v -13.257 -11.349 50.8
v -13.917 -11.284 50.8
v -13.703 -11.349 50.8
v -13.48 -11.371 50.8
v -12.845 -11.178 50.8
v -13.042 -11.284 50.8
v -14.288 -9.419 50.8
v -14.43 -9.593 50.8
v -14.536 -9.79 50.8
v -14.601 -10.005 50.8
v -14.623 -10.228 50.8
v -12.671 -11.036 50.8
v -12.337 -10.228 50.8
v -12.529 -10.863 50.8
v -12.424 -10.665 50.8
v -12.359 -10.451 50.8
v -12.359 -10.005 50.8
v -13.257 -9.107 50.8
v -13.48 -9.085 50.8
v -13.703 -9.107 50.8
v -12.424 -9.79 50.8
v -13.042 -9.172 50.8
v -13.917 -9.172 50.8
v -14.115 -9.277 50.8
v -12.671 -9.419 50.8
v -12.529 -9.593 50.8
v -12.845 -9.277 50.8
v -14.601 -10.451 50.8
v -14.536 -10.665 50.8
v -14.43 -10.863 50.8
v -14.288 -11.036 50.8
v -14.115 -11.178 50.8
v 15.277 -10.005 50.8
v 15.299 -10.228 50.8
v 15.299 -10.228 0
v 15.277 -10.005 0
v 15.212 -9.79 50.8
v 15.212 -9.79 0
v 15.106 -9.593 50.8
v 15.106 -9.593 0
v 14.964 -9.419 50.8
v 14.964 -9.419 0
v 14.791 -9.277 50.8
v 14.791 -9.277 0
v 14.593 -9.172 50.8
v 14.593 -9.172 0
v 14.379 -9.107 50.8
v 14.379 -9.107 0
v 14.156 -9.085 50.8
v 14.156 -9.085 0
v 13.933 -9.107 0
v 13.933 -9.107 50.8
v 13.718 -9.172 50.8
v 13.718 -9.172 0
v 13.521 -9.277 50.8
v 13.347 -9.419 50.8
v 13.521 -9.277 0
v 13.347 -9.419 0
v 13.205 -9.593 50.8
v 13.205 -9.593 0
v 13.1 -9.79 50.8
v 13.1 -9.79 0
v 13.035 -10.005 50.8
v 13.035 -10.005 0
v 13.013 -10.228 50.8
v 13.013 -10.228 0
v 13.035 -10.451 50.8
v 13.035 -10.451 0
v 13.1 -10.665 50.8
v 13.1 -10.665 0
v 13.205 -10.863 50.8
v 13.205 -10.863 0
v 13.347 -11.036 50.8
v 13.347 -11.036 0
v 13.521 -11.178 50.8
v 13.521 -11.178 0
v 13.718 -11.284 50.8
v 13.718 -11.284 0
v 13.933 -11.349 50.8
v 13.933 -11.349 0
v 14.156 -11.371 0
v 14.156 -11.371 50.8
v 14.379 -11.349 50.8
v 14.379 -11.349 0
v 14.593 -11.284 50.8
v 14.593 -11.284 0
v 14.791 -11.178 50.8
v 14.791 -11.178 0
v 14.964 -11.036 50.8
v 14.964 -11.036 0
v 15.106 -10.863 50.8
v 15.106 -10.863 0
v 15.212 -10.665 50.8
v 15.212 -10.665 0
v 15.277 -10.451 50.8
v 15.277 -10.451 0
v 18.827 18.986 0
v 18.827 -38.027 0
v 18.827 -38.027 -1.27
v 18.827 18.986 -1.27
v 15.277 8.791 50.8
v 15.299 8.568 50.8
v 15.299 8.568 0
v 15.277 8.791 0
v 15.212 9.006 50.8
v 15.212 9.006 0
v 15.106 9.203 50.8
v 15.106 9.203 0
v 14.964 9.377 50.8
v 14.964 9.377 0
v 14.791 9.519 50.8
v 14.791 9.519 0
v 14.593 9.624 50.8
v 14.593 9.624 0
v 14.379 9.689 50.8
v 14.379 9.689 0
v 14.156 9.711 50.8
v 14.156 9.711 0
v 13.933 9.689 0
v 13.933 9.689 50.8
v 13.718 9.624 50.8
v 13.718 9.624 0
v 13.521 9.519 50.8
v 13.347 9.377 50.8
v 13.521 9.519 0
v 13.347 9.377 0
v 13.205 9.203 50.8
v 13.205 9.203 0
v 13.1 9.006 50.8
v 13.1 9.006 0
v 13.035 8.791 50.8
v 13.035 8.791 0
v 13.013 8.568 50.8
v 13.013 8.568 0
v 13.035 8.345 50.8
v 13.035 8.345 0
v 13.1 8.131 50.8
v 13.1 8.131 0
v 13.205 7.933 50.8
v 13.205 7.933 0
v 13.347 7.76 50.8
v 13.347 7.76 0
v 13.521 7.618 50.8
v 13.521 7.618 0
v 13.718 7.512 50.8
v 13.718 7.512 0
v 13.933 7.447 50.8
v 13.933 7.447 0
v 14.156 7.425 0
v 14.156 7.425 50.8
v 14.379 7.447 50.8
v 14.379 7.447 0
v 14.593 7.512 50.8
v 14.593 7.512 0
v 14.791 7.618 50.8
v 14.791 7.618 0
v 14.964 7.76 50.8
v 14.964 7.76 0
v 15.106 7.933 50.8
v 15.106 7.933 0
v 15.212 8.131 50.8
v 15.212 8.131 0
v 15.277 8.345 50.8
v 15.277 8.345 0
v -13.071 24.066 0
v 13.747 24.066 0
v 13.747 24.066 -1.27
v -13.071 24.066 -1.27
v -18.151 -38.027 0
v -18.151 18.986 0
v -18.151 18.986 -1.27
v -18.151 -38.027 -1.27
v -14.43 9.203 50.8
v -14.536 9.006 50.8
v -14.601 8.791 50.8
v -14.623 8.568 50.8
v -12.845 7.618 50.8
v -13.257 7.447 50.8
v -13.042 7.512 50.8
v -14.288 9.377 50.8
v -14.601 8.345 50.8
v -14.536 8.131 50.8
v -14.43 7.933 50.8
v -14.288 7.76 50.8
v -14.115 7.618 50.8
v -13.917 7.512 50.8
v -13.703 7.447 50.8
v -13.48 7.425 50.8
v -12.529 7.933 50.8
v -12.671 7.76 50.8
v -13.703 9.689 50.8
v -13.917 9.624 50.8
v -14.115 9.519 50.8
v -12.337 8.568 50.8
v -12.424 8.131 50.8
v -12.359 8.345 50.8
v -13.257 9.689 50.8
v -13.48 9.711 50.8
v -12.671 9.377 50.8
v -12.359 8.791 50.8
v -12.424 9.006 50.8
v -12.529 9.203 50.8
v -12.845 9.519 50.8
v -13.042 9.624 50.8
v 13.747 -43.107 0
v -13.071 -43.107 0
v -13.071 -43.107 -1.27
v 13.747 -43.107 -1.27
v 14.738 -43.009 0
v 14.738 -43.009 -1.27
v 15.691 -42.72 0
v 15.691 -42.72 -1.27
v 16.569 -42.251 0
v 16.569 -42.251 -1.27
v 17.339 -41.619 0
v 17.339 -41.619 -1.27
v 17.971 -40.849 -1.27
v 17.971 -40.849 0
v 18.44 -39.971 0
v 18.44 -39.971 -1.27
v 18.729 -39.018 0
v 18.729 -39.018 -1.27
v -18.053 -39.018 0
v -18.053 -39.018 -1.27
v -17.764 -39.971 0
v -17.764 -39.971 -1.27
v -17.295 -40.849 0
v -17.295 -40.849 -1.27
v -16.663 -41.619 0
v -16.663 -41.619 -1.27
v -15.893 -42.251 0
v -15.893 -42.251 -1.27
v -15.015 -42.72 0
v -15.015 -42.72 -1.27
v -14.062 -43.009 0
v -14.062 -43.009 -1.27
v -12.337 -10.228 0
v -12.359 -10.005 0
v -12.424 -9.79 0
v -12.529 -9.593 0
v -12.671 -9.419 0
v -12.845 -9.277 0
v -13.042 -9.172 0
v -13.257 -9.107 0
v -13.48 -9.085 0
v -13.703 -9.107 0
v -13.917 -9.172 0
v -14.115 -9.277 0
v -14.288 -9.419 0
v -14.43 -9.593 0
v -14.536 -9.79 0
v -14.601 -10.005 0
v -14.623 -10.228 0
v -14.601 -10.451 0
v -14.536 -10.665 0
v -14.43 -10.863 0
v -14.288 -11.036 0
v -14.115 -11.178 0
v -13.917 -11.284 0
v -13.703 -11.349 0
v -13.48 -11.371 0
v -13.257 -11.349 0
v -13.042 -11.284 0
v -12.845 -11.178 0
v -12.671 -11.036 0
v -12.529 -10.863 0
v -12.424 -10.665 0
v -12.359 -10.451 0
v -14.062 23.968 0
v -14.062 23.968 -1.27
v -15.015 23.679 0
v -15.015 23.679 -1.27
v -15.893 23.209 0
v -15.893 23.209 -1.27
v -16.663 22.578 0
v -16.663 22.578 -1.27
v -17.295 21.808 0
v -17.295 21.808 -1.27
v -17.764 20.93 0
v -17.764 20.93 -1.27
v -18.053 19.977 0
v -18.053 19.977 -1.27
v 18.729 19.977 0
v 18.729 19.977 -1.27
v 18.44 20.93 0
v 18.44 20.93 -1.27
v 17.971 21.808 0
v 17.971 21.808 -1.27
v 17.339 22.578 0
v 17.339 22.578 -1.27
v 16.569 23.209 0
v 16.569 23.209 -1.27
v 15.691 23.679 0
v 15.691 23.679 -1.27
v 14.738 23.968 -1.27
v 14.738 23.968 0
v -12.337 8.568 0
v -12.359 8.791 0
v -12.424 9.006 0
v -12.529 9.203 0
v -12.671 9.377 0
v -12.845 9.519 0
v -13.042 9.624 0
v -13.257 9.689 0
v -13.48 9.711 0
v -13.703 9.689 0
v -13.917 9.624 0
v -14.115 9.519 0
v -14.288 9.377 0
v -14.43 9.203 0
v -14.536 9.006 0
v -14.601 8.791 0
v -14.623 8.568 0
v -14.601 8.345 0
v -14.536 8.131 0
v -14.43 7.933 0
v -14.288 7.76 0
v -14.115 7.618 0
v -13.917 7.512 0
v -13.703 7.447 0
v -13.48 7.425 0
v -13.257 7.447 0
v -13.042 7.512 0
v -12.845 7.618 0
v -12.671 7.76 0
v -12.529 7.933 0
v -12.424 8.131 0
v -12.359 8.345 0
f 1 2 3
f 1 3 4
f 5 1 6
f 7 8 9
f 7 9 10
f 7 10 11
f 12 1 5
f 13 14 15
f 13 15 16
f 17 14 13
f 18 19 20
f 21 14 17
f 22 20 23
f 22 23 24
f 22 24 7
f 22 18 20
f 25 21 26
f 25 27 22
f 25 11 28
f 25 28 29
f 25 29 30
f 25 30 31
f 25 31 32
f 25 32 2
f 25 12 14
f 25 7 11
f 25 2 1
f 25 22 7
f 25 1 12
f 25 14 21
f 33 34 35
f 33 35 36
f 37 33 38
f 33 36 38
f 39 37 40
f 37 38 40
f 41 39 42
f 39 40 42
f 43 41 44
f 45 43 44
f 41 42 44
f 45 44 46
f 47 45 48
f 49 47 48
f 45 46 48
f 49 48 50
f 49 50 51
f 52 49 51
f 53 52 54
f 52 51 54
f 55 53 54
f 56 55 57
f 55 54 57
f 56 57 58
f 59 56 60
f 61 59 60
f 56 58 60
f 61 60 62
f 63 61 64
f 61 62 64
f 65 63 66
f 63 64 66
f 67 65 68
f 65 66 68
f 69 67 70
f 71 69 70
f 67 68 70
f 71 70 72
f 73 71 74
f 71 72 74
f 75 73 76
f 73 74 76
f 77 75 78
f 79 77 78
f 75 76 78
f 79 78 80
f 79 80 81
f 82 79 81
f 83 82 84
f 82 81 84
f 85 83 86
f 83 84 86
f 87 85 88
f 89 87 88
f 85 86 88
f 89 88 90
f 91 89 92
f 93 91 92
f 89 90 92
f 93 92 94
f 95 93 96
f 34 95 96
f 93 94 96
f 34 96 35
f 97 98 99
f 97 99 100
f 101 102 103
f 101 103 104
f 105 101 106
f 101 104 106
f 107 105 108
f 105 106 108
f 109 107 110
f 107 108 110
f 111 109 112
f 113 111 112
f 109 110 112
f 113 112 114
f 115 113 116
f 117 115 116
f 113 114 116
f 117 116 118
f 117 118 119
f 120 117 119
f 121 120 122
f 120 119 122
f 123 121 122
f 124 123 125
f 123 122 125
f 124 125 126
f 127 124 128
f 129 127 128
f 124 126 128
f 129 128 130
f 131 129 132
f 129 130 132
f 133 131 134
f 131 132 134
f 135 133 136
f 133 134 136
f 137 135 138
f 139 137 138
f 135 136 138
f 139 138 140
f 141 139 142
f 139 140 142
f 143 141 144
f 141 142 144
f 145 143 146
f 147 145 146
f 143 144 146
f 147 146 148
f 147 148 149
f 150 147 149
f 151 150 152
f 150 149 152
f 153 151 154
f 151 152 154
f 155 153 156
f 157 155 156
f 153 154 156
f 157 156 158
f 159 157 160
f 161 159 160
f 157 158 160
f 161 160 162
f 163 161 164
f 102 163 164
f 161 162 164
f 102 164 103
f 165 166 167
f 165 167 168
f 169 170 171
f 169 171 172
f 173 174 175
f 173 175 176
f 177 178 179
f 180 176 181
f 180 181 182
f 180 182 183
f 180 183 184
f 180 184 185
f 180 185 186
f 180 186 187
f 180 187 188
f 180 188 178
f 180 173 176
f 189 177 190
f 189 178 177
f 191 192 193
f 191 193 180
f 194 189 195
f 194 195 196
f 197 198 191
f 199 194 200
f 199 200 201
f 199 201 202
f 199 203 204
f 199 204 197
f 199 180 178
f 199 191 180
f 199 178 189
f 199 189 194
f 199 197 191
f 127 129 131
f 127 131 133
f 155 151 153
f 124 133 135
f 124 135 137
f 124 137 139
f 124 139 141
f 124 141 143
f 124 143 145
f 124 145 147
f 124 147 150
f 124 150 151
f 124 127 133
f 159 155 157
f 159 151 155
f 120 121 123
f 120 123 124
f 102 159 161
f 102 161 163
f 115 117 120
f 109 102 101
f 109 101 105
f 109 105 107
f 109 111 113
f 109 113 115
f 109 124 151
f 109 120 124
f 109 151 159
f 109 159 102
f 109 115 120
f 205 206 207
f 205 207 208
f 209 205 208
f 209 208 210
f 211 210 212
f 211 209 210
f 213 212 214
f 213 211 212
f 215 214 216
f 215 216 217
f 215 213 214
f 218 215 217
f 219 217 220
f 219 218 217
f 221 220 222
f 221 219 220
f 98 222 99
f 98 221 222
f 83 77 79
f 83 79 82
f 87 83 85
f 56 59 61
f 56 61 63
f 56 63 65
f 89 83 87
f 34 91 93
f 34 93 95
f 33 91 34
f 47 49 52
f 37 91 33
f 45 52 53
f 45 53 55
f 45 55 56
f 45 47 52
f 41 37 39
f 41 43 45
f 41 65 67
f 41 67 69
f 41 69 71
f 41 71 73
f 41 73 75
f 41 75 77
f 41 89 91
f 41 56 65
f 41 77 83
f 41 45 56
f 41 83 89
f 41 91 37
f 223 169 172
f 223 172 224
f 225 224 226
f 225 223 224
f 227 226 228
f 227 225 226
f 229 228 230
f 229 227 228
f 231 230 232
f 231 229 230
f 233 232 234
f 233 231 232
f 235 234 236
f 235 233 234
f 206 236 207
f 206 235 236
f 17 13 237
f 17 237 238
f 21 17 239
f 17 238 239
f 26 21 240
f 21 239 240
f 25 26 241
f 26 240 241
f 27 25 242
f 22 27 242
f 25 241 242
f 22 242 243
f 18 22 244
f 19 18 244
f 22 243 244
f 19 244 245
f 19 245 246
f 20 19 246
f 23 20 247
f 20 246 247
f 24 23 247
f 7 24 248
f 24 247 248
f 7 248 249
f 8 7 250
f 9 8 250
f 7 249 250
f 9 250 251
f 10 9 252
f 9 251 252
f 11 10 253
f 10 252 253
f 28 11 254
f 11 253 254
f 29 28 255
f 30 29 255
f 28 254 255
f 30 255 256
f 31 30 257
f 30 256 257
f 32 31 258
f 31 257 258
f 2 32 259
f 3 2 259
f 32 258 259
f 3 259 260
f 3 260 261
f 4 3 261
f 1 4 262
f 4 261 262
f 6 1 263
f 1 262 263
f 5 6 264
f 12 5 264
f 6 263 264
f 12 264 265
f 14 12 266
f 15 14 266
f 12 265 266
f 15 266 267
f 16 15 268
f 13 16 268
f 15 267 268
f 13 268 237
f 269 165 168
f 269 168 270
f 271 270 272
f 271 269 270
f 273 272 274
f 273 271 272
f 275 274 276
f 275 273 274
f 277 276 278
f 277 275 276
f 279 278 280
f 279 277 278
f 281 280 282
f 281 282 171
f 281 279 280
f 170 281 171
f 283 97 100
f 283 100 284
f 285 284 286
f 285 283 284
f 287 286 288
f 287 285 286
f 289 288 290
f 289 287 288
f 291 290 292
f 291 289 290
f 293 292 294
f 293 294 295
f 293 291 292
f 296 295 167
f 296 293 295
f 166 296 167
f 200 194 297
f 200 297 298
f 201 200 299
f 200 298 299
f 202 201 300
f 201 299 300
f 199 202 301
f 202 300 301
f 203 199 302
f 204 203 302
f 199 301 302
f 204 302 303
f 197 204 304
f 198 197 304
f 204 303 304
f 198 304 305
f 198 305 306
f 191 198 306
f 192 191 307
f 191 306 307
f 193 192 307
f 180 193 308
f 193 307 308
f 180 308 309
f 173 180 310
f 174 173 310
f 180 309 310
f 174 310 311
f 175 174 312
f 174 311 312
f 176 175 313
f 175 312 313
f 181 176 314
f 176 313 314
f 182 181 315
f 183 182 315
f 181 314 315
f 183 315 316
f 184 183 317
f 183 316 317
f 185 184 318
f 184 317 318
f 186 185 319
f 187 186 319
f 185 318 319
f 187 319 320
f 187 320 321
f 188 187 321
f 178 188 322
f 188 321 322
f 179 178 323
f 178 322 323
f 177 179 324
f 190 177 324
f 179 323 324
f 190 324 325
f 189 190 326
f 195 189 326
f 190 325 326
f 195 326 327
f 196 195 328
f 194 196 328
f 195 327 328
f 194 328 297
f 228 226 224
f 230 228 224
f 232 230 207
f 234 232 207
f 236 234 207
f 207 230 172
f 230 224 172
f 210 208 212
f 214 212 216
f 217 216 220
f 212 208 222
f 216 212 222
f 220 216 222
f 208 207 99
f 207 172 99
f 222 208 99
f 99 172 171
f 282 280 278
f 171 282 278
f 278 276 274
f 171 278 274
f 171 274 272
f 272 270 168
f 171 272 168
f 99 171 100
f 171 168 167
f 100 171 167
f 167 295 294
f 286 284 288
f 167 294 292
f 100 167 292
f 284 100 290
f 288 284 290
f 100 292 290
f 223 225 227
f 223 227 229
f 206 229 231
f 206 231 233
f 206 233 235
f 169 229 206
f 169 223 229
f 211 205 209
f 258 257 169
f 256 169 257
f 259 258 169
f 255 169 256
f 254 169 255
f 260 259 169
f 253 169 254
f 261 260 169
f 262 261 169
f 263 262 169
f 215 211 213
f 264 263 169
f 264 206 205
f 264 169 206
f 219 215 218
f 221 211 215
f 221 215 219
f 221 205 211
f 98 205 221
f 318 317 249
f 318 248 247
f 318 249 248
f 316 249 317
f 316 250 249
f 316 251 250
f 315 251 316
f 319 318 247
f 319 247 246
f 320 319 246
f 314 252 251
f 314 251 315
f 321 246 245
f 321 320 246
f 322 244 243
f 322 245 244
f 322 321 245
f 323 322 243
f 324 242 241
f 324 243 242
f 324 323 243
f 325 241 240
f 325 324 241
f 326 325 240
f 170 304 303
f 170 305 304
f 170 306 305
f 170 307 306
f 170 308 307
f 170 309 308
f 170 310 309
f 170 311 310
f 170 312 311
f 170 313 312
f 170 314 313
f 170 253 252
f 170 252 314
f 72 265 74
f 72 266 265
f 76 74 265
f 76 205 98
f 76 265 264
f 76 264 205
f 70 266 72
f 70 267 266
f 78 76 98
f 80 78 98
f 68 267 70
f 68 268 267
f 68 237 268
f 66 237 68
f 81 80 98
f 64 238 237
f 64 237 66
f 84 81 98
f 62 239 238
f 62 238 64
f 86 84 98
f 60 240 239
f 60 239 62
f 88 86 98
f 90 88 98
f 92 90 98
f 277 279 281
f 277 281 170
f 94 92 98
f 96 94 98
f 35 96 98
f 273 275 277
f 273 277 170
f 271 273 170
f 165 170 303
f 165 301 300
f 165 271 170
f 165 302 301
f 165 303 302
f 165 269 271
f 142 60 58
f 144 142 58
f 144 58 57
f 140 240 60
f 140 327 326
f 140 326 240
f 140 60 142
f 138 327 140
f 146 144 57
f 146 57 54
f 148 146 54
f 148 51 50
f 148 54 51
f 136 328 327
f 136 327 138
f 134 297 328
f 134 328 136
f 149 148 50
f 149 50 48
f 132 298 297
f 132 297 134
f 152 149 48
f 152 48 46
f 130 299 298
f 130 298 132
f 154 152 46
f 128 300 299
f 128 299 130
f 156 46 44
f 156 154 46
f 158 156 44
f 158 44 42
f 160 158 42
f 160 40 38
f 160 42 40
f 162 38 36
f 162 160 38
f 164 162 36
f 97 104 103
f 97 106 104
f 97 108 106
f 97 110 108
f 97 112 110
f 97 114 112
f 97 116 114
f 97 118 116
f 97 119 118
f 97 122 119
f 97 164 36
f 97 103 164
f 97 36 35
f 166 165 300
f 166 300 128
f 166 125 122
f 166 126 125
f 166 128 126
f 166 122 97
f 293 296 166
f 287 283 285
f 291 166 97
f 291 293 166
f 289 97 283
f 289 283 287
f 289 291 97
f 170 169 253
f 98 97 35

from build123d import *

# Parameters (mm, degrees)
F0_R     = 1.143
F1_DEPTH = 50.8
F2_DEPTH = 1.27


with BuildPart() as f1:
    # F0 (on Top) → F1 (new body)
    with BuildSketch(Plane.XY):
        with Locations((-13.479616519, -10.2275963136)):
            Circle(F0_R)
    extrude(amount=F1_DEPTH)



with BuildPart() as f1b:
    # F0 (on Top) → F1, piece 2 (new body)
    with BuildSketch(Plane.XY):
        with Locations((-13.479616519, 8.5684026553)):
            Circle(F0_R)
    extrude(amount=F1_DEPTH)


with BuildPart() as f1c:
    # F0 (on Top) → F1, piece 3 (new body)
    with BuildSketch(Plane.XY):
        with Locations((14.1555836841, 8.5684026553)):
            Circle(F0_R)
    extrude(amount=F1_DEPTH)


with BuildPart() as f1d:
    # F0 (on Top) → F1, piece 4 (new body)
    with BuildSketch(Plane.XY):
        with Locations((14.1555836841, -10.2275963136)):
            Circle(F0_R)
    extrude(amount=F1_DEPTH)


with BuildPart() as f1_1:
    add(f1.part)

    add(f1b.part)  # F2 merges F1b

    add(f1c.part)  # F2 merges F1c

    add(f1d.part)  # F2 merges F1d
    # F0 (on Top) → F2 (join)
    with BuildSketch(Plane.XY):
        with BuildLine():
            ThreePointArc((18.8266877085, 18.9855317903), (17.3387901569, 22.5776342387), (13.7466877085, 24.0655317903))
            Line((13.7466877085, 24.0655317903), (-13.0707205434, 24.0655317903))
            ThreePointArc((-13.0707205434, 24.0655317903), (-16.6628229918, 22.5776342387), (-18.1507205434, 18.9855317903))
            Line((-18.1507205434, 18.9855317903), (-18.1507205434, -20.6447254485))
            Line((-18.1507205434, -20.6447254485), (-18.1507205434, -38.0270736456))
            ThreePointArc((-18.1507205434, -38.0270736456), (-16.6628229918, -41.619176094), (-13.0707205434, -43.1070736456))
            Line((-13.0707205434, -43.1070736456), (13.7466877085, -43.1070736456))
            ThreePointArc((13.7466877085, -43.1070736456), (17.3387901569, -41.619176094), (18.8266877085, -38.0270736456))
            Line((18.8266877085, -38.0270736456), (18.8266877085, -20.6447254485))
            Line((18.8266877085, -20.6447254485), (18.8266877085, 18.9855317903))
        make_face()
        with Locations((-13.479616519, -10.2275963136)):
            Circle(F0_R, mode=Mode.SUBTRACT)
        with Locations((14.1555836841, -10.2275963136)):
            Circle(F0_R, mode=Mode.SUBTRACT)
        with Locations((-13.479616519, 8.5684026553)):
            Circle(F0_R, mode=Mode.SUBTRACT)
        with Locations((14.1555836841, 8.5684026553)):
            Circle(F0_R, mode=Mode.SUBTRACT)
        with Locations((14.1555836841, -10.2275963136)):
            Circle(F0_R)
        with Locations((-13.479616519, -10.2275963136)):
            Circle(F0_R)
        with Locations((-13.479616519, 8.5684026553)):
            Circle(F0_R)
        with Locations((14.1555836841, 8.5684026553)):
            Circle(F0_R)
    extrude(amount=-F2_DEPTH)


solid = f1_1.part
